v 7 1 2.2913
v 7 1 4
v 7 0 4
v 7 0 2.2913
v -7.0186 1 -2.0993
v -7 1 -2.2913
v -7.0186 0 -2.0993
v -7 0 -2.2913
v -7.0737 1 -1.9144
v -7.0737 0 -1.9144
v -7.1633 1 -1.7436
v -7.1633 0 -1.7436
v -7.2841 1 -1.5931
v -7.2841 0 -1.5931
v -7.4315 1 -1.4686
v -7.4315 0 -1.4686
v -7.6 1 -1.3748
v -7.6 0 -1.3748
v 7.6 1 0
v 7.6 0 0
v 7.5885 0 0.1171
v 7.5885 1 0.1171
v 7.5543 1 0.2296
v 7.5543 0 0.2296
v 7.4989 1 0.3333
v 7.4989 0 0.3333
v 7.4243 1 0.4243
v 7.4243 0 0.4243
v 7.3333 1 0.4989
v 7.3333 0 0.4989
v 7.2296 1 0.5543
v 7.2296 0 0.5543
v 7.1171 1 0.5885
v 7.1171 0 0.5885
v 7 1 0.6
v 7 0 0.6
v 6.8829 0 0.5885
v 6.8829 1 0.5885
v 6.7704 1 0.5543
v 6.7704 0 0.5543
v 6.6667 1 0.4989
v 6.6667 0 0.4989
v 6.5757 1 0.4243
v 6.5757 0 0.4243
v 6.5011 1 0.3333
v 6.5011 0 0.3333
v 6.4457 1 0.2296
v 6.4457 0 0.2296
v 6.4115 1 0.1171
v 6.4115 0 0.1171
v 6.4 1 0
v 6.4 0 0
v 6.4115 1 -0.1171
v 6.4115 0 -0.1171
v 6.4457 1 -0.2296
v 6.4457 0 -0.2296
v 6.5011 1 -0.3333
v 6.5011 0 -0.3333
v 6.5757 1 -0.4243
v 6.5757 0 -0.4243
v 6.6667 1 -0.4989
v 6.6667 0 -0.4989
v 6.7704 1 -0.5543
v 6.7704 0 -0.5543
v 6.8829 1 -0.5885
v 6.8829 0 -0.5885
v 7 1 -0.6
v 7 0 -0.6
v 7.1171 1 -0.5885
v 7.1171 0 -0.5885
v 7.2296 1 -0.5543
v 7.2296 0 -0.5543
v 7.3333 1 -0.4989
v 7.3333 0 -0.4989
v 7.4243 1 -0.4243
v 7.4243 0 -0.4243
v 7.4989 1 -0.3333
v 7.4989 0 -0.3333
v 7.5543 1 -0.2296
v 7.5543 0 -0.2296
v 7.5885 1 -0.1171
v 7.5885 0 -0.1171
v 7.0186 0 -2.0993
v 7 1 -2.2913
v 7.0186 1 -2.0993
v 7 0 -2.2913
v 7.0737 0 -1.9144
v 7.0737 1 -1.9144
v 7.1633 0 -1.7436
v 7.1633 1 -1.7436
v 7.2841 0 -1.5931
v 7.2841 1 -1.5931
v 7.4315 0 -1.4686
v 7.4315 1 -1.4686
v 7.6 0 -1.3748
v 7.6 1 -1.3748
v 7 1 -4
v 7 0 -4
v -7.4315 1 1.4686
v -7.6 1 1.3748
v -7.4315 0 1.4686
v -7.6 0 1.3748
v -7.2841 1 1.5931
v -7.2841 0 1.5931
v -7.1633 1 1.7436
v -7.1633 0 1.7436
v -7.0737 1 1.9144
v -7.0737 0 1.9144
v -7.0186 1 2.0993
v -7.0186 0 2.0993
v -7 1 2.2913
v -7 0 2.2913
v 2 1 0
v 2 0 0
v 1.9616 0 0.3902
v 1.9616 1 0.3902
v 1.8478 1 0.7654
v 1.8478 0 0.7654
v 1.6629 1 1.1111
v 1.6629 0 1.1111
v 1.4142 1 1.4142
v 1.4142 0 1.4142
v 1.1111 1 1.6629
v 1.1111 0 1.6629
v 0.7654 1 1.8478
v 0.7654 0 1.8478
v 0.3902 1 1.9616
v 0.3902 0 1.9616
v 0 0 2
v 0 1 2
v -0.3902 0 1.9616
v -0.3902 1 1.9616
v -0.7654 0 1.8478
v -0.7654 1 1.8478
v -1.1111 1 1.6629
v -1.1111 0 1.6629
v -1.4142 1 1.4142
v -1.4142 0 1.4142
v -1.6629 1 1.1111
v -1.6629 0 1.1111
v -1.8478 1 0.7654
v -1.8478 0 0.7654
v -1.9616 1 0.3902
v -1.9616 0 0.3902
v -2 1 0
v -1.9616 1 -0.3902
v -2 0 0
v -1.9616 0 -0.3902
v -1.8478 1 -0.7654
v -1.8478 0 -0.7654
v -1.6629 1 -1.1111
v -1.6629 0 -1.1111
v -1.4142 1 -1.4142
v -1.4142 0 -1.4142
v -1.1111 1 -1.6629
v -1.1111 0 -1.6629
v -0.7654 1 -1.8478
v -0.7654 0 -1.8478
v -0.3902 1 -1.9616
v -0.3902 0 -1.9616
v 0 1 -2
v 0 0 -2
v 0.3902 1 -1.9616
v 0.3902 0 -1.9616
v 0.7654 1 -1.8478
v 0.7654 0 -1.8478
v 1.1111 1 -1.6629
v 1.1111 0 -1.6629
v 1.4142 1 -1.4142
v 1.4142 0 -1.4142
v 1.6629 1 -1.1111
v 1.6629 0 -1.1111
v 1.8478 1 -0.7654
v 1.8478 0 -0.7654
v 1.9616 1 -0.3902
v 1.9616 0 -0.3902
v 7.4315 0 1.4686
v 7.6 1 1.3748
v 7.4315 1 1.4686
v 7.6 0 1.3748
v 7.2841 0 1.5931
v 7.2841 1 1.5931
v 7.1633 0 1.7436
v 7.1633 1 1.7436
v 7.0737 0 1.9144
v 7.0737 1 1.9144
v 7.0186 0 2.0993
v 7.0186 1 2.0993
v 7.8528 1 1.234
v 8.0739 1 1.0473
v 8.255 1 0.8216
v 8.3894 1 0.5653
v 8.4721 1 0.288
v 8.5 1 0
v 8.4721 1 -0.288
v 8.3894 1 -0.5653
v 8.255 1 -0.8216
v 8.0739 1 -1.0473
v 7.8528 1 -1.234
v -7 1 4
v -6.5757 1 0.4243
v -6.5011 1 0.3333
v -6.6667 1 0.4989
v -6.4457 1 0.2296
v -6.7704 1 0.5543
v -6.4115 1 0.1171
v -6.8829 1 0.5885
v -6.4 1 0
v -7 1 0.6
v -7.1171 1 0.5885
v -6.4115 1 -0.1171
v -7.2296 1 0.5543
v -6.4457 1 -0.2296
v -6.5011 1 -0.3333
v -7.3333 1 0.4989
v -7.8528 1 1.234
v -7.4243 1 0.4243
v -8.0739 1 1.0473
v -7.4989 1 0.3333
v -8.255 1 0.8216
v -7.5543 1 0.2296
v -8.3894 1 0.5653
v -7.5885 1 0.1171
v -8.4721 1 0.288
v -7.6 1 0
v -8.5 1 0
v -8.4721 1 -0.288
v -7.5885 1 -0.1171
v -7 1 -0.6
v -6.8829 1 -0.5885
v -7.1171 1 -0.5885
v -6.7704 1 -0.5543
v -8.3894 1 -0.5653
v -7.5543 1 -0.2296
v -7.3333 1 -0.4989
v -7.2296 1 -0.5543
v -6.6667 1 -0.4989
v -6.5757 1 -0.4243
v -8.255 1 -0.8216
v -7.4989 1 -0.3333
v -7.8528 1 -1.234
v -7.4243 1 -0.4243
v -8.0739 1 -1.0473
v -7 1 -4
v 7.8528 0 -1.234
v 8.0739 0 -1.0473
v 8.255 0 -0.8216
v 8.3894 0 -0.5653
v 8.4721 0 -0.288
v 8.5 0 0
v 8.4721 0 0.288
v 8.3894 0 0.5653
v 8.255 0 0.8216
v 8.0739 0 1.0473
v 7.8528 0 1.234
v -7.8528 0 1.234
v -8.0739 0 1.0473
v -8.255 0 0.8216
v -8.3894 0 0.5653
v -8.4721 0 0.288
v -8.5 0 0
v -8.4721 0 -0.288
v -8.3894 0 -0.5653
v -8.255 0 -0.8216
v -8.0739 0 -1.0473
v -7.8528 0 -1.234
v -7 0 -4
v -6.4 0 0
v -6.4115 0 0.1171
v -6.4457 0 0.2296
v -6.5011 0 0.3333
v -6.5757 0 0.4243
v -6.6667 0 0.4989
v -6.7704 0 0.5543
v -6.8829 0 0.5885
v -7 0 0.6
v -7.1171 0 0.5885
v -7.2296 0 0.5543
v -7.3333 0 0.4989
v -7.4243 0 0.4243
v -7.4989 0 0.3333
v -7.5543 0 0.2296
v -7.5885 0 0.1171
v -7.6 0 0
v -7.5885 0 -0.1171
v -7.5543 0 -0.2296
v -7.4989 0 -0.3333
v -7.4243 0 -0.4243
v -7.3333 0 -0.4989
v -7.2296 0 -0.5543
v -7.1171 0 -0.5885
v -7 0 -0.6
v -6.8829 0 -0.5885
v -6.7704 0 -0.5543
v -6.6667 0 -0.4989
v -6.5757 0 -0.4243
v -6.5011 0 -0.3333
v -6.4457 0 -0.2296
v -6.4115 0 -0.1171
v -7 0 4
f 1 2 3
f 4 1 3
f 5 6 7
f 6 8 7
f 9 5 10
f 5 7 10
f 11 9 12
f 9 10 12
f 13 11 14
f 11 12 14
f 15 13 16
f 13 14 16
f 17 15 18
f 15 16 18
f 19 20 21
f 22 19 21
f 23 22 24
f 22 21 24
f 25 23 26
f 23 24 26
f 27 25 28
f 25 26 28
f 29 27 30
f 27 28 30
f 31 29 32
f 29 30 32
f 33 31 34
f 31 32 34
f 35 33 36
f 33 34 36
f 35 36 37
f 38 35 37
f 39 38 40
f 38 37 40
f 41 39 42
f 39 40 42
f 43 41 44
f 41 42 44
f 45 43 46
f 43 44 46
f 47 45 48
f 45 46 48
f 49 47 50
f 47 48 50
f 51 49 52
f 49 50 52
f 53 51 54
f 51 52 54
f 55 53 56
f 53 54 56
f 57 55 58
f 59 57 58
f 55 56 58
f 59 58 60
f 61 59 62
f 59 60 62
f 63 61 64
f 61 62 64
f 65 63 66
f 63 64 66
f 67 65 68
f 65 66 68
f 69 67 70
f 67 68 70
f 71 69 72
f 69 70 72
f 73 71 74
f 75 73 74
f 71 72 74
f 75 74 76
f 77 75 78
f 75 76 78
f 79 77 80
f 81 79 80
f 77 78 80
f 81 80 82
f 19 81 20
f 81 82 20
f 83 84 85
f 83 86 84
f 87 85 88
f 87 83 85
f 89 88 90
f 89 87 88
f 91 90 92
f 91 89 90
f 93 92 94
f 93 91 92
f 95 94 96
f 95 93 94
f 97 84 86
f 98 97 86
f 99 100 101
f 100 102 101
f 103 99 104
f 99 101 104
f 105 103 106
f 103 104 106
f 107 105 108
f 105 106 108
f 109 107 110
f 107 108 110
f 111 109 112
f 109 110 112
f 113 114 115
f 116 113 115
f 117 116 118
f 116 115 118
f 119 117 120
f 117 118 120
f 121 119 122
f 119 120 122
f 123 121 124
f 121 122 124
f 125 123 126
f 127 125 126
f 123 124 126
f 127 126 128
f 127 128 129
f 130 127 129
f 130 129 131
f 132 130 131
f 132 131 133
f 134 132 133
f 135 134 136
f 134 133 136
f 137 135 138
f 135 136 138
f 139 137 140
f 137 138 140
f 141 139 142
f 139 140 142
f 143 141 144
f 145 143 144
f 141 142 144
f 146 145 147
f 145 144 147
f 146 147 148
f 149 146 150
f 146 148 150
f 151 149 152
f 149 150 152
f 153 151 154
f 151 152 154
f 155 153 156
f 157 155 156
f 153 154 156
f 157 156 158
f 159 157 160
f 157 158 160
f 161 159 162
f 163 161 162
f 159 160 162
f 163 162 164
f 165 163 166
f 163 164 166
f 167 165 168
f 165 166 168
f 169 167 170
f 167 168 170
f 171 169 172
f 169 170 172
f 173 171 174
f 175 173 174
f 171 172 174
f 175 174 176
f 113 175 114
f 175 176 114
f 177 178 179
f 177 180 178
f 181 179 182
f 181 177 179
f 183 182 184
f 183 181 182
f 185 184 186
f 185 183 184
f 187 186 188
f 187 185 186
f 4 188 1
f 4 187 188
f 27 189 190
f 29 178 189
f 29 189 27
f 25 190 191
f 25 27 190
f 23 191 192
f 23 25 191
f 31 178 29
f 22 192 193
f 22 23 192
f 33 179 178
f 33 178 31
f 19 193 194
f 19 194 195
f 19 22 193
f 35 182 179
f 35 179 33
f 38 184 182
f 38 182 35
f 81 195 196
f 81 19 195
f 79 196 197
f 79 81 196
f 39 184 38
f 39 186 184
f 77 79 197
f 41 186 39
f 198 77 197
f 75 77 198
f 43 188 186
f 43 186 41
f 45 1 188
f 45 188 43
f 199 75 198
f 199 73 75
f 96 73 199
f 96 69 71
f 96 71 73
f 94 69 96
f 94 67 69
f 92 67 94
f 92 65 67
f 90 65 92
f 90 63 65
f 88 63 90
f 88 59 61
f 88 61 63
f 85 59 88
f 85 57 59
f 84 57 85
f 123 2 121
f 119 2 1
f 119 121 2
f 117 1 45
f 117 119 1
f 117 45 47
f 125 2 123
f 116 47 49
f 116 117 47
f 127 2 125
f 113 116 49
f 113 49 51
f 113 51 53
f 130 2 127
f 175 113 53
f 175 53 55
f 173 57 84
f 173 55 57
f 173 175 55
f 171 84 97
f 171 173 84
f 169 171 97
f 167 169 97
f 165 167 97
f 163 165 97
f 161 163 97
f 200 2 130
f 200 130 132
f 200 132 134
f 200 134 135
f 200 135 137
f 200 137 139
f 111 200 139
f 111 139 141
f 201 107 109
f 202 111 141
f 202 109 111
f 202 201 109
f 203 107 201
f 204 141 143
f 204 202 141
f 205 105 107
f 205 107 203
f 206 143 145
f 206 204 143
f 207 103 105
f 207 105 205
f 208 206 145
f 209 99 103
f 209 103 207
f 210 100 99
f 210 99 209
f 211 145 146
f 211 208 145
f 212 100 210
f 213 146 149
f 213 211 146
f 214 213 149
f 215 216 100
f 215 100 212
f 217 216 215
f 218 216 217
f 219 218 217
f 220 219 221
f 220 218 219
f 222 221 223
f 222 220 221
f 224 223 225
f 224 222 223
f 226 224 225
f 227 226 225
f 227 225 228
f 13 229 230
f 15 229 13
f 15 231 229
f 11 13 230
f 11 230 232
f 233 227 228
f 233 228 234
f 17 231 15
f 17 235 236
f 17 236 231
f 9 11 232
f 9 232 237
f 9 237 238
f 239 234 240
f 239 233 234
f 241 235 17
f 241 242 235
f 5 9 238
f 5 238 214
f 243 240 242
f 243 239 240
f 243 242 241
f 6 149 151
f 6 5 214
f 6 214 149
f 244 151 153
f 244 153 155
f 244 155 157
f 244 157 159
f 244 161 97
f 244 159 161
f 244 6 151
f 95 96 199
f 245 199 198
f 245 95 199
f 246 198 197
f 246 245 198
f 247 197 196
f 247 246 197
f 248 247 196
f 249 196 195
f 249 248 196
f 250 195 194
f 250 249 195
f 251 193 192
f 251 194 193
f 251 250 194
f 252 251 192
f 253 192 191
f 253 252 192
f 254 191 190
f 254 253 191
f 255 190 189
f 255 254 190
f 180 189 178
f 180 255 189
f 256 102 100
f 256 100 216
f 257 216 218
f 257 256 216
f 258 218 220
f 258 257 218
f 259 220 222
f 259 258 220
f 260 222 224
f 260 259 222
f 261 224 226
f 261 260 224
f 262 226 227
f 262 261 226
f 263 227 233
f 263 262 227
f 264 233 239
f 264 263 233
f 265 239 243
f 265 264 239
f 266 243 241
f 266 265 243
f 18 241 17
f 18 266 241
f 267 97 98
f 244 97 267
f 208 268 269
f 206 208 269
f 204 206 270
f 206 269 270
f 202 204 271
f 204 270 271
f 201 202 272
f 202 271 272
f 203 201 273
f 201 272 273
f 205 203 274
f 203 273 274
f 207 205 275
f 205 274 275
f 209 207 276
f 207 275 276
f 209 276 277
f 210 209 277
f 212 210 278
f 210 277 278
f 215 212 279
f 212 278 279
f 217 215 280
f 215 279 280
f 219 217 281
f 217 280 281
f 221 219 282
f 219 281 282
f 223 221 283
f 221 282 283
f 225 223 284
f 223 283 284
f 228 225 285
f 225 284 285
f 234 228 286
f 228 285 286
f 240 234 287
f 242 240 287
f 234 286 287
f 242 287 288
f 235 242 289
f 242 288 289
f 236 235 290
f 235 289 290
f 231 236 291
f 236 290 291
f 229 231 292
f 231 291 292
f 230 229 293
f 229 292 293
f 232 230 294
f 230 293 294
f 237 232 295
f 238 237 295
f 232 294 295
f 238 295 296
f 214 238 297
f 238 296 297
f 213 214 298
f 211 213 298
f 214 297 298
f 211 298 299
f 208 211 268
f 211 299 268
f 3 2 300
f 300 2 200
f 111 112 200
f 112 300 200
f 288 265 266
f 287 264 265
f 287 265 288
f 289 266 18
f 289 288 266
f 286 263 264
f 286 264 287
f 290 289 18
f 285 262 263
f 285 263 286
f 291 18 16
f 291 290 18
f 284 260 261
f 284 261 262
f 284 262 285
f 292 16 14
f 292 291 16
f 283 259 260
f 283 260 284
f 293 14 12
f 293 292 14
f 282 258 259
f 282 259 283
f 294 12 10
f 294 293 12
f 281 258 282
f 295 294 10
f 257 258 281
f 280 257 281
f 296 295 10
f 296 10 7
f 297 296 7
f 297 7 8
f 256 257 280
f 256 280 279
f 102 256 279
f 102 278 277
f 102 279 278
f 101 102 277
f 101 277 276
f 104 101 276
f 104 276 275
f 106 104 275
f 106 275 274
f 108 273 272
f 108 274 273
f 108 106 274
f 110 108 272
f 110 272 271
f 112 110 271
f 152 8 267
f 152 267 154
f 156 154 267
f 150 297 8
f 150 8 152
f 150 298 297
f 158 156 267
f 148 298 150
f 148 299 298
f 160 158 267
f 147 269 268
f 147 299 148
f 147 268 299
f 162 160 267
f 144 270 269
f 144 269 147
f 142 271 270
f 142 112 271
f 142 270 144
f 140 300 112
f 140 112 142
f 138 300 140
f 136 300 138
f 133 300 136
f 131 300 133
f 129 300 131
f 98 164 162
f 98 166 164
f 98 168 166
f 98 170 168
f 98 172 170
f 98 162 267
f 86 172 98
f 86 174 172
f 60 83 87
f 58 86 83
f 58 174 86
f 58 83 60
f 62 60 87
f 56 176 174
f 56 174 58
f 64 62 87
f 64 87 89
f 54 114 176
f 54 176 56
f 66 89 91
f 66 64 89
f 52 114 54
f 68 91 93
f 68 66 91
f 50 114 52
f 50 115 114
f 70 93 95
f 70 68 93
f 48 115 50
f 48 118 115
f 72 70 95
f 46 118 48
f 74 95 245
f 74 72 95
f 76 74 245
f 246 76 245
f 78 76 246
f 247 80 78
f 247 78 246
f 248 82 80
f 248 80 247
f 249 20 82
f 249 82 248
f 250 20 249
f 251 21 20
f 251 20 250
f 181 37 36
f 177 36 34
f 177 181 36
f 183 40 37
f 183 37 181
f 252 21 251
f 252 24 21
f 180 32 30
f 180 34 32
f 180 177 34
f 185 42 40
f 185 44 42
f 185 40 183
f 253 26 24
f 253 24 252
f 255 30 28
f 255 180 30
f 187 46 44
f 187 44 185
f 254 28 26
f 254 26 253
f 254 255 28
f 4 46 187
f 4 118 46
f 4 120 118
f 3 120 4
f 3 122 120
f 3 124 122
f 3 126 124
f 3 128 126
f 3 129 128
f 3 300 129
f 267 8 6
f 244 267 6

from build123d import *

# Parameters (mm, degrees)
EXTRUDE1_DEPTH      = 4
EXTRUDE2_DEPTH      = 12.357816692
EXTRUDE2_DEPTH_BACK = 12.357816692
SKETCH2_R           = 1
EXTRUDE3_DEPTH      = 12.357816692
EXTRUDE3_DEPTH_BACK = 12.357816692
FILLET2_R           = 1
EXTRUDE4_DEPTH      = 14
EXTRUDE4_DEPTH_BACK = 3
SKETCH5_W           = 0.95644391
SKETCH5_H           = 3.560686456
EXTRUDE5_DEPTH      = 9
EXTRUDE6_DEPTH      = 1
SKETCH7_R           = 0.6
EXTRUDE7_DEPTH      = 1
FILLET3_R           = 1
SKETCH8_R           = 2
EXTRUDE8_DEPTH      = 1
SKETCH9_R           = 15.158662045
EXTRUDE9_DEPTH      = 18.811513131


with BuildPart() as part:
    # Sketch1 → Extrude1 (new, symmetric)
    with BuildSketch(Plane.XY):
        Polygon((0, 0), (-7, 0), (-7, 8), (7, 8), (7, 0), align=None)
    extrude(amount=EXTRUDE1_DEPTH, both=True)

    # Sketch2 → Extrude2 (cut, two sides: drawn at the far end of the back side and taken through both)
    with BuildSketch(Plane.XY.offset(-EXTRUDE2_DEPTH_BACK)):
        with Locations((4.5, 5.5)):
            Circle(SKETCH2_R)
    extrude(amount=EXTRUDE2_DEPTH + EXTRUDE2_DEPTH_BACK, mode=Mode.SUBTRACT)

    # Sketch4 → Extrude3 (cut, two sides: drawn at the far end of the back side and taken through both)
    with BuildSketch(Plane(origin=(0, 0, 0), x_dir=(0, 0, -1), z_dir=(1, 0, 0)).offset(-EXTRUDE3_DEPTH_BACK)):
        Polygon((0, 1), (3, 1), (3, 9.732029078), (-3, 9.732029078), (-3, 1), align=None)
    extrude(amount=EXTRUDE3_DEPTH + EXTRUDE3_DEPTH_BACK, mode=Mode.SUBTRACT)

    # Fillet2
    fillet2_edges = [part.edges().sort_by_distance(p)[0] for p in [
        (7, 8, -3.5),
        (7, 8, 3.5),
        (-7, 8, -3.5),
        (-7, 8, 3.5),
    ]]
    fillet(fillet2_edges, radius=FILLET2_R)

    # Sketch3 → Extrude4 (add, two sides: drawn at the far end of the back side and taken through both)
    with BuildSketch(Plane.XY.offset(-EXTRUDE4_DEPTH_BACK)):
        with BuildLine():
            ThreePointArc((-3, 6), (-4.060660172, 3.439339828), (-1.5, 4.5))
            ThreePointArc((-1.5, 4.5), (-1.939339828, 5.560660172), (-3, 6))
        make_face()
    extrude(amount=EXTRUDE4_DEPTH + EXTRUDE4_DEPTH_BACK)

    # Sketch5 → Extrude5 (cut)
    with BuildSketch(Plane.XY.offset(14)):
        with Locations((-4.478221955, 4.280343228)):
            Rectangle(SKETCH5_W, SKETCH5_H)
    extrude(amount=-EXTRUDE5_DEPTH, mode=Mode.SUBTRACT)

    # Sketch6 → Extrude6 (add)
    with BuildSketch(Plane.XZ):
        with BuildLine():
            ThreePointArc((-5.910714286, -1.031240337), (-6, 0), (-5.910714286, 1.031240337))
            ThreePointArc((-5.910714286, 1.031240337), (-8.5, 0), (-5.910714286, -1.031240337))
        make_face()
        with BuildLine():
            ThreePointArc((7, -1.5), (8.5, 0), (7, 1.5))
            Line((7, 1.5), (7, -1.5))
        make_face()
    extrude(amount=-EXTRUDE6_DEPTH)

    # Sketch7 → Extrude7 (cut)
    with BuildSketch(Plane.XZ):
        with Locations((-7, 0)):
            Circle(SKETCH7_R)
        with Locations((7, 0)):
            Circle(SKETCH7_R)
    extrude(amount=-EXTRUDE7_DEPTH, mode=Mode.SUBTRACT)

    # Fillet3
    fillet3_edges = [part.edges().sort_by_distance(p)[0] for p in [
        (7, 0.5, -1.5),
        (7, 0.5, 1.5),
        (-7, 0.5, -1.5),
        (-7, 0.5, 1.5),
    ]]
    fillet(fillet3_edges, radius=FILLET3_R)

    # Sketch8 → Extrude8 (cut)
    with BuildSketch(Plane.XZ):
        Circle(SKETCH8_R)
    extrude(amount=-EXTRUDE8_DEPTH, mode=Mode.SUBTRACT)

    # Sketch9 → Extrude9 (cut, through all)
    with BuildSketch(Plane(origin=(0, 1, 0), x_dir=(1, 0, 0), z_dir=(0, 1, 0))):
        Circle(SKETCH9_R)
    extrude(amount=EXTRUDE9_DEPTH, mode=Mode.SUBTRACT)


solid = part.part
